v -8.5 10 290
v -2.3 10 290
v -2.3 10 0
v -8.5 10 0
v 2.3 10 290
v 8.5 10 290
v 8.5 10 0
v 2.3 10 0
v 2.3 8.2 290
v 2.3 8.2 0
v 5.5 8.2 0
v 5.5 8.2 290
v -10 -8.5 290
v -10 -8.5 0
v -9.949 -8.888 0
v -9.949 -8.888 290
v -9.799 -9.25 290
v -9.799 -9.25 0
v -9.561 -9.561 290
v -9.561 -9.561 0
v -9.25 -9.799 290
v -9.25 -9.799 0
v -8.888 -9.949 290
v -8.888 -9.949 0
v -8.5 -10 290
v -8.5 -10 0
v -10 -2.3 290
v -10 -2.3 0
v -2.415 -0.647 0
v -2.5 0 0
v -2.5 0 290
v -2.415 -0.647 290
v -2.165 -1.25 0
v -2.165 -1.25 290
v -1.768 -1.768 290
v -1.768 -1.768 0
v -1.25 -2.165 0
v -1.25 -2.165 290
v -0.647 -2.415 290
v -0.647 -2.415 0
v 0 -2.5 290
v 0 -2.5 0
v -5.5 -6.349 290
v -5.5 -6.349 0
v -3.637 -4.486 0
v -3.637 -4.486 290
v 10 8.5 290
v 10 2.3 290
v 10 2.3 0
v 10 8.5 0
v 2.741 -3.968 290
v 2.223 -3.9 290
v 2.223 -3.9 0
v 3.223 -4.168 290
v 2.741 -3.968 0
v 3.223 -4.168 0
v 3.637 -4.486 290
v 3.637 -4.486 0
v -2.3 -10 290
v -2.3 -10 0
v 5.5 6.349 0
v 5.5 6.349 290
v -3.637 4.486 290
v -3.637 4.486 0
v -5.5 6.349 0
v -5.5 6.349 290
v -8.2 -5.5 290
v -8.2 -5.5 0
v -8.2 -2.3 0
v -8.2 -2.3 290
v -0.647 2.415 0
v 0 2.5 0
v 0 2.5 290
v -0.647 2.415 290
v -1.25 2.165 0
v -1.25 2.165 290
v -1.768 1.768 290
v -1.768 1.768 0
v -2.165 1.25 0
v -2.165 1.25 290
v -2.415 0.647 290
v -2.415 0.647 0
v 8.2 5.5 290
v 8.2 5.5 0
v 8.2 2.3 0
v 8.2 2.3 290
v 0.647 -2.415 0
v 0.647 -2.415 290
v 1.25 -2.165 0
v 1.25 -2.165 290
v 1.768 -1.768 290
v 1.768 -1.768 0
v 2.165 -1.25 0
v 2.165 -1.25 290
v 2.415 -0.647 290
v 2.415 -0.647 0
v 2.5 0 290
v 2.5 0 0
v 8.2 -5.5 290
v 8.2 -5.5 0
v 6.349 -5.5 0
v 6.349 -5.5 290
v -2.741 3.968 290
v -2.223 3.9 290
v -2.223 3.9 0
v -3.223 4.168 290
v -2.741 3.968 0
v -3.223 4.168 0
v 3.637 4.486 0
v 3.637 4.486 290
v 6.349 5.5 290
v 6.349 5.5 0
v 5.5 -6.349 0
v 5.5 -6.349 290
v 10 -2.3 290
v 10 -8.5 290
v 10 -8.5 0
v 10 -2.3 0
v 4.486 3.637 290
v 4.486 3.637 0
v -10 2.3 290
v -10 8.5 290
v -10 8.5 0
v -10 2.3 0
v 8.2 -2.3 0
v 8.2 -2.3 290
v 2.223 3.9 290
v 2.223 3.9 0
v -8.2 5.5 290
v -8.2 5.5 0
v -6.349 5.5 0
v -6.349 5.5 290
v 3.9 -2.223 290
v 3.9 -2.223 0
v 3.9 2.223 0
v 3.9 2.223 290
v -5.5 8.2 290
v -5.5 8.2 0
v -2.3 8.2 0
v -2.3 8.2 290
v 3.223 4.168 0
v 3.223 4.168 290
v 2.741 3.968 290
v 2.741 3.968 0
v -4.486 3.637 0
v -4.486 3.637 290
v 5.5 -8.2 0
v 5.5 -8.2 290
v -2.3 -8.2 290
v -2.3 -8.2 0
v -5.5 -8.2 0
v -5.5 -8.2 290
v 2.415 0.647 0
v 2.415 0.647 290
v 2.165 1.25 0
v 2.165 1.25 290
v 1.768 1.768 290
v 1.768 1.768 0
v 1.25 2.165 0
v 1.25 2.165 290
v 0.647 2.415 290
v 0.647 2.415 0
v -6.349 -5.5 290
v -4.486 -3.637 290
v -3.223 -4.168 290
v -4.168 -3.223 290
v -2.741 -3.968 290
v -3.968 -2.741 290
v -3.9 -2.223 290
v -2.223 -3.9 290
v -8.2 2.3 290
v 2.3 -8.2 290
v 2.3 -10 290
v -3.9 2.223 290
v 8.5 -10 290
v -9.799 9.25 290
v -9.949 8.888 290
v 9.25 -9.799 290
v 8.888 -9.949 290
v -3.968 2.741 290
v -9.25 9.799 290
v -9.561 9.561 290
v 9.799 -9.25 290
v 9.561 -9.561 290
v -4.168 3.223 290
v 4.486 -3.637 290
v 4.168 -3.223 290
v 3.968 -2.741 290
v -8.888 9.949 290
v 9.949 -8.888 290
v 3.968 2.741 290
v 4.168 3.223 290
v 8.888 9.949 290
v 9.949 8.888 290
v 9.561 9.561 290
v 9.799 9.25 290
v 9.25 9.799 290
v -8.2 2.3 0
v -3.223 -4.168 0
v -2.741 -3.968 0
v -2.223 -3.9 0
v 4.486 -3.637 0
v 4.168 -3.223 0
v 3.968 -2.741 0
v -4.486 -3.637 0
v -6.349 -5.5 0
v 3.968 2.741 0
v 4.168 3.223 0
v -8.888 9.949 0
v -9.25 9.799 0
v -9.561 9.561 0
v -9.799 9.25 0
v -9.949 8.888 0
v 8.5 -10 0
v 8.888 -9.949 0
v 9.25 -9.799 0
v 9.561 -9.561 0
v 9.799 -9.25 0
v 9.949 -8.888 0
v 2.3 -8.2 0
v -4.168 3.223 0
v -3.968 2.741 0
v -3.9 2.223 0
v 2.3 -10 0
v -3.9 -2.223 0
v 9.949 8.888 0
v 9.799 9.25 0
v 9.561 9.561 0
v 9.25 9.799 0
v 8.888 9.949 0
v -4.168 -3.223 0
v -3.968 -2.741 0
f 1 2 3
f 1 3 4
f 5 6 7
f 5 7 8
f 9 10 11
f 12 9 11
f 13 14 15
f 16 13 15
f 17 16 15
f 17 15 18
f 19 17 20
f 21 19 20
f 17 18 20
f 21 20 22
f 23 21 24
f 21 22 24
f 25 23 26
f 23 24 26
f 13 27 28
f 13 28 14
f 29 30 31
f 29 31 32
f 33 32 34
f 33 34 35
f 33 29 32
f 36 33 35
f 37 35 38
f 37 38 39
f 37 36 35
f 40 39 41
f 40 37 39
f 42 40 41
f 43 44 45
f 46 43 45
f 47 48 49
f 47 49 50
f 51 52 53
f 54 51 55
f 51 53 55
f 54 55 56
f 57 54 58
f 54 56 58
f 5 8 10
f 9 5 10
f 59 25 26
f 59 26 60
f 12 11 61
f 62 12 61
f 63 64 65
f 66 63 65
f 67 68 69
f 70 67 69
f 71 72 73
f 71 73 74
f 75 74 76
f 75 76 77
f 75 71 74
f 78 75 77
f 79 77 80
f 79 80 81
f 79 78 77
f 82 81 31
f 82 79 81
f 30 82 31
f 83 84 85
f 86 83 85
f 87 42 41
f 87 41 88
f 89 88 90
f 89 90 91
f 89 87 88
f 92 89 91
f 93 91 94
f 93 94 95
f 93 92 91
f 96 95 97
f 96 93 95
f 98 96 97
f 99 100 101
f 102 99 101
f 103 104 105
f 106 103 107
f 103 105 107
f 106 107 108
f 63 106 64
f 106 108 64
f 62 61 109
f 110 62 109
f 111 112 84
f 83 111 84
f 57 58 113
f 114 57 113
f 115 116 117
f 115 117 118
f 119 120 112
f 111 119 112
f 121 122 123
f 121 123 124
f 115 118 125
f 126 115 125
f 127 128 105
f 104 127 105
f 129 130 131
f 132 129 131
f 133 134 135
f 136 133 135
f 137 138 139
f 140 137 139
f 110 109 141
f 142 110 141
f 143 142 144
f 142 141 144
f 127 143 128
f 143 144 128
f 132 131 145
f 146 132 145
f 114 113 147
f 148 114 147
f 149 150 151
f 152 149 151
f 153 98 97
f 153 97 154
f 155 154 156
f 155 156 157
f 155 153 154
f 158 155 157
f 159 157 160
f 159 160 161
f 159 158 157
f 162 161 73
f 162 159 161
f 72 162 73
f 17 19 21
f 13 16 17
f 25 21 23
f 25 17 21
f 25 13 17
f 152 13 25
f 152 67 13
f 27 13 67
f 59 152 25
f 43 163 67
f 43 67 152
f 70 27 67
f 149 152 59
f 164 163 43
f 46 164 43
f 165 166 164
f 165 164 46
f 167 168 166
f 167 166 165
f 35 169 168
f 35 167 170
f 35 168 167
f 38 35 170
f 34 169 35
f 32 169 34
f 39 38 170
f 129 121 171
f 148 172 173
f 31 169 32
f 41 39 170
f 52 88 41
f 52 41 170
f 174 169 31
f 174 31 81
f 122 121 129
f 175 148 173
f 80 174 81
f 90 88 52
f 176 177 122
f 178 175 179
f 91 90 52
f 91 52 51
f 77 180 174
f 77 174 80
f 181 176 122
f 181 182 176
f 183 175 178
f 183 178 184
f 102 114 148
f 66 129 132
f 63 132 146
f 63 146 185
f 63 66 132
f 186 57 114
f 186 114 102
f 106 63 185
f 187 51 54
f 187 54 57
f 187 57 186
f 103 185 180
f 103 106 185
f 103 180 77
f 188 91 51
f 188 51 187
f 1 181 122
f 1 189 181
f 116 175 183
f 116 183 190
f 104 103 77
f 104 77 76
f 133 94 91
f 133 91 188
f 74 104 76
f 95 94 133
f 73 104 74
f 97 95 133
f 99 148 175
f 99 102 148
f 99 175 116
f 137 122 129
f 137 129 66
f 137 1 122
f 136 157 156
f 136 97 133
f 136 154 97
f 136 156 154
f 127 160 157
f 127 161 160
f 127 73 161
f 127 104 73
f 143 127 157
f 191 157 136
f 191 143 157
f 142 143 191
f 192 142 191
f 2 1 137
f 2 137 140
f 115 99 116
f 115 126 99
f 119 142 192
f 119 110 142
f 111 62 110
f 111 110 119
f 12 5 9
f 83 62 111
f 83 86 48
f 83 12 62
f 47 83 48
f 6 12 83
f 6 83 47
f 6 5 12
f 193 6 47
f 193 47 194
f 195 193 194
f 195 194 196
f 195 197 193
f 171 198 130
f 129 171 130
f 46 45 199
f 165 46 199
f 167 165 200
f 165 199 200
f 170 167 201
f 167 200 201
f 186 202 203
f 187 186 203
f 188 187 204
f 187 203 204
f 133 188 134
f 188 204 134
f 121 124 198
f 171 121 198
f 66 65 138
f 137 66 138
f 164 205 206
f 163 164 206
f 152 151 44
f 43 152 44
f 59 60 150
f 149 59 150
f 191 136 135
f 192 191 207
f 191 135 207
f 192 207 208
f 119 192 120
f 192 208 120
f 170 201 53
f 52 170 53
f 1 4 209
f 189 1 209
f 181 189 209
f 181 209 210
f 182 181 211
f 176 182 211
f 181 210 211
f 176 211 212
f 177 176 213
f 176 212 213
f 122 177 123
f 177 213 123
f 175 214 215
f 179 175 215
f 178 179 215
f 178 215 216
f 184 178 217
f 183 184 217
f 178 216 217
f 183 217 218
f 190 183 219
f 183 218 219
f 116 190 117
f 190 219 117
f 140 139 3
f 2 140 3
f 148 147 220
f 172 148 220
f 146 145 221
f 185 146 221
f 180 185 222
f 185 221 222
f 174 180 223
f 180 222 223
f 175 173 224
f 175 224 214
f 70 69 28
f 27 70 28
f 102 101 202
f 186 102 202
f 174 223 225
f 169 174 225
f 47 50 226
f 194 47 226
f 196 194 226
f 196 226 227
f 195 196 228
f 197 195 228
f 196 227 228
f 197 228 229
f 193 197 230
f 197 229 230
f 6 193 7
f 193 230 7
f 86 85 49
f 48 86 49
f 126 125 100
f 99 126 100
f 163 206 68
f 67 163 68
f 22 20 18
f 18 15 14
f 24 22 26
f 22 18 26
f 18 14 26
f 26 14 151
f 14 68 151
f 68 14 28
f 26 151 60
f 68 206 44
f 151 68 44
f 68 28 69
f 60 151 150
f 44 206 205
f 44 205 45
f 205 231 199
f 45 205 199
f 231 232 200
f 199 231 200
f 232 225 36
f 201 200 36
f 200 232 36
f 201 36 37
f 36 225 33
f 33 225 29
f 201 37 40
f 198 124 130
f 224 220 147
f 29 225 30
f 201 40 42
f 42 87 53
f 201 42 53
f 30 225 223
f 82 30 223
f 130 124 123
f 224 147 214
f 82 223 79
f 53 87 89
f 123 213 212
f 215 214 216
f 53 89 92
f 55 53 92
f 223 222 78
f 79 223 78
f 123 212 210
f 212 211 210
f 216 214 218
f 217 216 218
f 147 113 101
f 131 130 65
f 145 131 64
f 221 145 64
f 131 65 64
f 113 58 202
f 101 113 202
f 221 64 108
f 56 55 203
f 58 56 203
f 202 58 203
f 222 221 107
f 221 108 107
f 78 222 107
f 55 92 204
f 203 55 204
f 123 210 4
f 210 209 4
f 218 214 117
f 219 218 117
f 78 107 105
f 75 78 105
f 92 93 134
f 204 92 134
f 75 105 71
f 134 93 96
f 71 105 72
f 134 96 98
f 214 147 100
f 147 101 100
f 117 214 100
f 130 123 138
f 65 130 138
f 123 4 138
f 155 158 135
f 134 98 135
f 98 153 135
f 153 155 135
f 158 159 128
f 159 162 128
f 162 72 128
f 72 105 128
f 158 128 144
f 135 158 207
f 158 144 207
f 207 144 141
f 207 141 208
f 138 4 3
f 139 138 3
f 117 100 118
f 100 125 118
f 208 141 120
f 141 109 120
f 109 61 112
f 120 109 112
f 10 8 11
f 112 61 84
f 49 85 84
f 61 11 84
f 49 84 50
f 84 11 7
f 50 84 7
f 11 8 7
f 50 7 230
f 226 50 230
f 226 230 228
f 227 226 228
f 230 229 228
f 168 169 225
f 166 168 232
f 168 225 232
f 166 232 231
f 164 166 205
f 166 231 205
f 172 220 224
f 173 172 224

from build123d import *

# Parameters (mm, degrees)
SALIENTE_EXTRUIR1_DEPTH = 290


with BuildPart() as part:
    # Croquis1 → Saliente-Extruir1 (new body)
    with BuildSketch(Plane.XY):
        with BuildLine():
            Line((-10, 8.5), (-10, 2.3))
            Line((-10, 2.3), (-8.2, 2.3))
            Line((-8.2, 2.3), (-8.2, 5.5))
            Line((-8.2, 5.5), (-6.348528137, 5.5))
            Line((-6.348528137, 5.5), (-4.485786438, 3.6372583))
            ThreePointArc((-4.485786438, 3.6372583), (-4.052240935, 2.988411603), (-3.9, 2.223044738))
            Line((-3.9, 2.223044738), (-3.9, 0))
            Line((-3.9, 0), (-3.9, -2.223044738))
            ThreePointArc((-3.9, -2.223044738), (-4.052240935, -2.988411603), (-4.485786438, -3.6372583))
            Line((-4.485786438, -3.6372583), (-6.348528137, -5.5))
            Line((-6.348528137, -5.5), (-8.2, -5.5))
            Line((-8.2, -5.5), (-8.2, -2.3))
            Line((-8.2, -2.3), (-10, -2.3))
            Line((-10, -2.3), (-10, -8.5))
            ThreePointArc((-10, -8.5), (-9.560660172, -9.560660172), (-8.5, -10))
            Line((-8.5, -10), (-2.3, -10))
            Line((-2.3, -10), (-2.3, -8.2))
            Line((-2.3, -8.2), (-5.5, -8.2))
            Line((-5.5, -8.2), (-5.5, -6.348528137))
            Line((-5.5, -6.348528137), (-3.6372583, -4.485786438))
            ThreePointArc((-3.6372583, -4.485786438), (-2.988411603, -4.052240935), (-2.223044738, -3.9))
            Line((-2.223044738, -3.9), (0, -3.9))
            Line((0, -3.9), (2.223044738, -3.9))
            ThreePointArc((2.223044738, -3.9), (2.988411603, -4.052240935), (3.6372583, -4.485786438))
            Line((3.6372583, -4.485786438), (5.5, -6.348528137))
            Line((5.5, -6.348528137), (5.5, -8.2))
            Line((5.5, -8.2), (2.3, -8.2))
            Line((2.3, -8.2), (2.3, -10))
            Line((2.3, -10), (8.5, -10))
            ThreePointArc((8.5, -10), (9.560660172, -9.560660172), (10, -8.5))
            Line((10, -8.5), (10, -2.3))
            Line((10, -2.3), (8.2, -2.3))
            Line((8.2, -2.3), (8.2, -5.5))
            Line((8.2, -5.5), (6.348528137, -5.5))
            Line((6.348528137, -5.5), (4.485786438, -3.6372583))
            ThreePointArc((4.485786438, -3.6372583), (4.052240935, -2.988411603), (3.9, -2.223044738))
            Line((3.9, -2.223044738), (3.9, 0))
            Line((3.9, 0), (3.9, 2.223044738))
            ThreePointArc((3.9, 2.223044738), (4.052240935, 2.988411603), (4.485786438, 3.6372583))
            Line((4.485786438, 3.6372583), (6.348528137, 5.5))
            Line((6.348528137, 5.5), (8.2, 5.5))
            Line((8.2, 5.5), (8.2, 2.3))
            Line((8.2, 2.3), (10, 2.3))
            Line((10, 2.3), (10, 8.5))
            ThreePointArc((10, 8.5), (9.560660172, 9.560660172), (8.5, 10))
            Line((8.5, 10), (2.3, 10))
            Line((2.3, 10), (2.3, 8.2))
            Line((2.3, 8.2), (5.5, 8.2))
            Line((5.5, 8.2), (5.5, 6.348528137))
            Line((5.5, 6.348528137), (3.6372583, 4.485786438))
            ThreePointArc((3.6372583, 4.485786438), (2.988411603, 4.052240935), (2.223044738, 3.9))
            Line((2.223044738, 3.9), (0, 3.9))
            Line((0, 3.9), (-2.223044738, 3.9))
            ThreePointArc((-2.223044738, 3.9), (-2.988411603, 4.052240935), (-3.6372583, 4.485786438))
            Line((-3.6372583, 4.485786438), (-5.5, 6.348528137))
            Line((-5.5, 6.348528137), (-5.5, 8.2))
            Line((-5.5, 8.2), (-2.3, 8.2))
            Line((-2.3, 8.2), (-2.3, 10))
            Line((-2.3, 10), (-8.5, 10))
            ThreePointArc((-8.5, 10), (-9.560660172, 9.560660172), (-10, 8.5))
        make_face()
        with BuildLine():
            ThreePointArc((0, 2.5), (-1.767766953, 1.767766953), (-2.5, 0))
            ThreePointArc((-2.5, 0), (-1.767766953, -1.767766953), (0, -2.5))
            ThreePointArc((0, -2.5), (1.767766953, -1.767766953), (2.5, 0))
            ThreePointArc((2.5, 0), (1.767766953, 1.767766953), (0, 2.5))
        make_face(mode=Mode.SUBTRACT)
    extrude(amount=SALIENTE_EXTRUIR1_DEPTH)


solid = part.part
